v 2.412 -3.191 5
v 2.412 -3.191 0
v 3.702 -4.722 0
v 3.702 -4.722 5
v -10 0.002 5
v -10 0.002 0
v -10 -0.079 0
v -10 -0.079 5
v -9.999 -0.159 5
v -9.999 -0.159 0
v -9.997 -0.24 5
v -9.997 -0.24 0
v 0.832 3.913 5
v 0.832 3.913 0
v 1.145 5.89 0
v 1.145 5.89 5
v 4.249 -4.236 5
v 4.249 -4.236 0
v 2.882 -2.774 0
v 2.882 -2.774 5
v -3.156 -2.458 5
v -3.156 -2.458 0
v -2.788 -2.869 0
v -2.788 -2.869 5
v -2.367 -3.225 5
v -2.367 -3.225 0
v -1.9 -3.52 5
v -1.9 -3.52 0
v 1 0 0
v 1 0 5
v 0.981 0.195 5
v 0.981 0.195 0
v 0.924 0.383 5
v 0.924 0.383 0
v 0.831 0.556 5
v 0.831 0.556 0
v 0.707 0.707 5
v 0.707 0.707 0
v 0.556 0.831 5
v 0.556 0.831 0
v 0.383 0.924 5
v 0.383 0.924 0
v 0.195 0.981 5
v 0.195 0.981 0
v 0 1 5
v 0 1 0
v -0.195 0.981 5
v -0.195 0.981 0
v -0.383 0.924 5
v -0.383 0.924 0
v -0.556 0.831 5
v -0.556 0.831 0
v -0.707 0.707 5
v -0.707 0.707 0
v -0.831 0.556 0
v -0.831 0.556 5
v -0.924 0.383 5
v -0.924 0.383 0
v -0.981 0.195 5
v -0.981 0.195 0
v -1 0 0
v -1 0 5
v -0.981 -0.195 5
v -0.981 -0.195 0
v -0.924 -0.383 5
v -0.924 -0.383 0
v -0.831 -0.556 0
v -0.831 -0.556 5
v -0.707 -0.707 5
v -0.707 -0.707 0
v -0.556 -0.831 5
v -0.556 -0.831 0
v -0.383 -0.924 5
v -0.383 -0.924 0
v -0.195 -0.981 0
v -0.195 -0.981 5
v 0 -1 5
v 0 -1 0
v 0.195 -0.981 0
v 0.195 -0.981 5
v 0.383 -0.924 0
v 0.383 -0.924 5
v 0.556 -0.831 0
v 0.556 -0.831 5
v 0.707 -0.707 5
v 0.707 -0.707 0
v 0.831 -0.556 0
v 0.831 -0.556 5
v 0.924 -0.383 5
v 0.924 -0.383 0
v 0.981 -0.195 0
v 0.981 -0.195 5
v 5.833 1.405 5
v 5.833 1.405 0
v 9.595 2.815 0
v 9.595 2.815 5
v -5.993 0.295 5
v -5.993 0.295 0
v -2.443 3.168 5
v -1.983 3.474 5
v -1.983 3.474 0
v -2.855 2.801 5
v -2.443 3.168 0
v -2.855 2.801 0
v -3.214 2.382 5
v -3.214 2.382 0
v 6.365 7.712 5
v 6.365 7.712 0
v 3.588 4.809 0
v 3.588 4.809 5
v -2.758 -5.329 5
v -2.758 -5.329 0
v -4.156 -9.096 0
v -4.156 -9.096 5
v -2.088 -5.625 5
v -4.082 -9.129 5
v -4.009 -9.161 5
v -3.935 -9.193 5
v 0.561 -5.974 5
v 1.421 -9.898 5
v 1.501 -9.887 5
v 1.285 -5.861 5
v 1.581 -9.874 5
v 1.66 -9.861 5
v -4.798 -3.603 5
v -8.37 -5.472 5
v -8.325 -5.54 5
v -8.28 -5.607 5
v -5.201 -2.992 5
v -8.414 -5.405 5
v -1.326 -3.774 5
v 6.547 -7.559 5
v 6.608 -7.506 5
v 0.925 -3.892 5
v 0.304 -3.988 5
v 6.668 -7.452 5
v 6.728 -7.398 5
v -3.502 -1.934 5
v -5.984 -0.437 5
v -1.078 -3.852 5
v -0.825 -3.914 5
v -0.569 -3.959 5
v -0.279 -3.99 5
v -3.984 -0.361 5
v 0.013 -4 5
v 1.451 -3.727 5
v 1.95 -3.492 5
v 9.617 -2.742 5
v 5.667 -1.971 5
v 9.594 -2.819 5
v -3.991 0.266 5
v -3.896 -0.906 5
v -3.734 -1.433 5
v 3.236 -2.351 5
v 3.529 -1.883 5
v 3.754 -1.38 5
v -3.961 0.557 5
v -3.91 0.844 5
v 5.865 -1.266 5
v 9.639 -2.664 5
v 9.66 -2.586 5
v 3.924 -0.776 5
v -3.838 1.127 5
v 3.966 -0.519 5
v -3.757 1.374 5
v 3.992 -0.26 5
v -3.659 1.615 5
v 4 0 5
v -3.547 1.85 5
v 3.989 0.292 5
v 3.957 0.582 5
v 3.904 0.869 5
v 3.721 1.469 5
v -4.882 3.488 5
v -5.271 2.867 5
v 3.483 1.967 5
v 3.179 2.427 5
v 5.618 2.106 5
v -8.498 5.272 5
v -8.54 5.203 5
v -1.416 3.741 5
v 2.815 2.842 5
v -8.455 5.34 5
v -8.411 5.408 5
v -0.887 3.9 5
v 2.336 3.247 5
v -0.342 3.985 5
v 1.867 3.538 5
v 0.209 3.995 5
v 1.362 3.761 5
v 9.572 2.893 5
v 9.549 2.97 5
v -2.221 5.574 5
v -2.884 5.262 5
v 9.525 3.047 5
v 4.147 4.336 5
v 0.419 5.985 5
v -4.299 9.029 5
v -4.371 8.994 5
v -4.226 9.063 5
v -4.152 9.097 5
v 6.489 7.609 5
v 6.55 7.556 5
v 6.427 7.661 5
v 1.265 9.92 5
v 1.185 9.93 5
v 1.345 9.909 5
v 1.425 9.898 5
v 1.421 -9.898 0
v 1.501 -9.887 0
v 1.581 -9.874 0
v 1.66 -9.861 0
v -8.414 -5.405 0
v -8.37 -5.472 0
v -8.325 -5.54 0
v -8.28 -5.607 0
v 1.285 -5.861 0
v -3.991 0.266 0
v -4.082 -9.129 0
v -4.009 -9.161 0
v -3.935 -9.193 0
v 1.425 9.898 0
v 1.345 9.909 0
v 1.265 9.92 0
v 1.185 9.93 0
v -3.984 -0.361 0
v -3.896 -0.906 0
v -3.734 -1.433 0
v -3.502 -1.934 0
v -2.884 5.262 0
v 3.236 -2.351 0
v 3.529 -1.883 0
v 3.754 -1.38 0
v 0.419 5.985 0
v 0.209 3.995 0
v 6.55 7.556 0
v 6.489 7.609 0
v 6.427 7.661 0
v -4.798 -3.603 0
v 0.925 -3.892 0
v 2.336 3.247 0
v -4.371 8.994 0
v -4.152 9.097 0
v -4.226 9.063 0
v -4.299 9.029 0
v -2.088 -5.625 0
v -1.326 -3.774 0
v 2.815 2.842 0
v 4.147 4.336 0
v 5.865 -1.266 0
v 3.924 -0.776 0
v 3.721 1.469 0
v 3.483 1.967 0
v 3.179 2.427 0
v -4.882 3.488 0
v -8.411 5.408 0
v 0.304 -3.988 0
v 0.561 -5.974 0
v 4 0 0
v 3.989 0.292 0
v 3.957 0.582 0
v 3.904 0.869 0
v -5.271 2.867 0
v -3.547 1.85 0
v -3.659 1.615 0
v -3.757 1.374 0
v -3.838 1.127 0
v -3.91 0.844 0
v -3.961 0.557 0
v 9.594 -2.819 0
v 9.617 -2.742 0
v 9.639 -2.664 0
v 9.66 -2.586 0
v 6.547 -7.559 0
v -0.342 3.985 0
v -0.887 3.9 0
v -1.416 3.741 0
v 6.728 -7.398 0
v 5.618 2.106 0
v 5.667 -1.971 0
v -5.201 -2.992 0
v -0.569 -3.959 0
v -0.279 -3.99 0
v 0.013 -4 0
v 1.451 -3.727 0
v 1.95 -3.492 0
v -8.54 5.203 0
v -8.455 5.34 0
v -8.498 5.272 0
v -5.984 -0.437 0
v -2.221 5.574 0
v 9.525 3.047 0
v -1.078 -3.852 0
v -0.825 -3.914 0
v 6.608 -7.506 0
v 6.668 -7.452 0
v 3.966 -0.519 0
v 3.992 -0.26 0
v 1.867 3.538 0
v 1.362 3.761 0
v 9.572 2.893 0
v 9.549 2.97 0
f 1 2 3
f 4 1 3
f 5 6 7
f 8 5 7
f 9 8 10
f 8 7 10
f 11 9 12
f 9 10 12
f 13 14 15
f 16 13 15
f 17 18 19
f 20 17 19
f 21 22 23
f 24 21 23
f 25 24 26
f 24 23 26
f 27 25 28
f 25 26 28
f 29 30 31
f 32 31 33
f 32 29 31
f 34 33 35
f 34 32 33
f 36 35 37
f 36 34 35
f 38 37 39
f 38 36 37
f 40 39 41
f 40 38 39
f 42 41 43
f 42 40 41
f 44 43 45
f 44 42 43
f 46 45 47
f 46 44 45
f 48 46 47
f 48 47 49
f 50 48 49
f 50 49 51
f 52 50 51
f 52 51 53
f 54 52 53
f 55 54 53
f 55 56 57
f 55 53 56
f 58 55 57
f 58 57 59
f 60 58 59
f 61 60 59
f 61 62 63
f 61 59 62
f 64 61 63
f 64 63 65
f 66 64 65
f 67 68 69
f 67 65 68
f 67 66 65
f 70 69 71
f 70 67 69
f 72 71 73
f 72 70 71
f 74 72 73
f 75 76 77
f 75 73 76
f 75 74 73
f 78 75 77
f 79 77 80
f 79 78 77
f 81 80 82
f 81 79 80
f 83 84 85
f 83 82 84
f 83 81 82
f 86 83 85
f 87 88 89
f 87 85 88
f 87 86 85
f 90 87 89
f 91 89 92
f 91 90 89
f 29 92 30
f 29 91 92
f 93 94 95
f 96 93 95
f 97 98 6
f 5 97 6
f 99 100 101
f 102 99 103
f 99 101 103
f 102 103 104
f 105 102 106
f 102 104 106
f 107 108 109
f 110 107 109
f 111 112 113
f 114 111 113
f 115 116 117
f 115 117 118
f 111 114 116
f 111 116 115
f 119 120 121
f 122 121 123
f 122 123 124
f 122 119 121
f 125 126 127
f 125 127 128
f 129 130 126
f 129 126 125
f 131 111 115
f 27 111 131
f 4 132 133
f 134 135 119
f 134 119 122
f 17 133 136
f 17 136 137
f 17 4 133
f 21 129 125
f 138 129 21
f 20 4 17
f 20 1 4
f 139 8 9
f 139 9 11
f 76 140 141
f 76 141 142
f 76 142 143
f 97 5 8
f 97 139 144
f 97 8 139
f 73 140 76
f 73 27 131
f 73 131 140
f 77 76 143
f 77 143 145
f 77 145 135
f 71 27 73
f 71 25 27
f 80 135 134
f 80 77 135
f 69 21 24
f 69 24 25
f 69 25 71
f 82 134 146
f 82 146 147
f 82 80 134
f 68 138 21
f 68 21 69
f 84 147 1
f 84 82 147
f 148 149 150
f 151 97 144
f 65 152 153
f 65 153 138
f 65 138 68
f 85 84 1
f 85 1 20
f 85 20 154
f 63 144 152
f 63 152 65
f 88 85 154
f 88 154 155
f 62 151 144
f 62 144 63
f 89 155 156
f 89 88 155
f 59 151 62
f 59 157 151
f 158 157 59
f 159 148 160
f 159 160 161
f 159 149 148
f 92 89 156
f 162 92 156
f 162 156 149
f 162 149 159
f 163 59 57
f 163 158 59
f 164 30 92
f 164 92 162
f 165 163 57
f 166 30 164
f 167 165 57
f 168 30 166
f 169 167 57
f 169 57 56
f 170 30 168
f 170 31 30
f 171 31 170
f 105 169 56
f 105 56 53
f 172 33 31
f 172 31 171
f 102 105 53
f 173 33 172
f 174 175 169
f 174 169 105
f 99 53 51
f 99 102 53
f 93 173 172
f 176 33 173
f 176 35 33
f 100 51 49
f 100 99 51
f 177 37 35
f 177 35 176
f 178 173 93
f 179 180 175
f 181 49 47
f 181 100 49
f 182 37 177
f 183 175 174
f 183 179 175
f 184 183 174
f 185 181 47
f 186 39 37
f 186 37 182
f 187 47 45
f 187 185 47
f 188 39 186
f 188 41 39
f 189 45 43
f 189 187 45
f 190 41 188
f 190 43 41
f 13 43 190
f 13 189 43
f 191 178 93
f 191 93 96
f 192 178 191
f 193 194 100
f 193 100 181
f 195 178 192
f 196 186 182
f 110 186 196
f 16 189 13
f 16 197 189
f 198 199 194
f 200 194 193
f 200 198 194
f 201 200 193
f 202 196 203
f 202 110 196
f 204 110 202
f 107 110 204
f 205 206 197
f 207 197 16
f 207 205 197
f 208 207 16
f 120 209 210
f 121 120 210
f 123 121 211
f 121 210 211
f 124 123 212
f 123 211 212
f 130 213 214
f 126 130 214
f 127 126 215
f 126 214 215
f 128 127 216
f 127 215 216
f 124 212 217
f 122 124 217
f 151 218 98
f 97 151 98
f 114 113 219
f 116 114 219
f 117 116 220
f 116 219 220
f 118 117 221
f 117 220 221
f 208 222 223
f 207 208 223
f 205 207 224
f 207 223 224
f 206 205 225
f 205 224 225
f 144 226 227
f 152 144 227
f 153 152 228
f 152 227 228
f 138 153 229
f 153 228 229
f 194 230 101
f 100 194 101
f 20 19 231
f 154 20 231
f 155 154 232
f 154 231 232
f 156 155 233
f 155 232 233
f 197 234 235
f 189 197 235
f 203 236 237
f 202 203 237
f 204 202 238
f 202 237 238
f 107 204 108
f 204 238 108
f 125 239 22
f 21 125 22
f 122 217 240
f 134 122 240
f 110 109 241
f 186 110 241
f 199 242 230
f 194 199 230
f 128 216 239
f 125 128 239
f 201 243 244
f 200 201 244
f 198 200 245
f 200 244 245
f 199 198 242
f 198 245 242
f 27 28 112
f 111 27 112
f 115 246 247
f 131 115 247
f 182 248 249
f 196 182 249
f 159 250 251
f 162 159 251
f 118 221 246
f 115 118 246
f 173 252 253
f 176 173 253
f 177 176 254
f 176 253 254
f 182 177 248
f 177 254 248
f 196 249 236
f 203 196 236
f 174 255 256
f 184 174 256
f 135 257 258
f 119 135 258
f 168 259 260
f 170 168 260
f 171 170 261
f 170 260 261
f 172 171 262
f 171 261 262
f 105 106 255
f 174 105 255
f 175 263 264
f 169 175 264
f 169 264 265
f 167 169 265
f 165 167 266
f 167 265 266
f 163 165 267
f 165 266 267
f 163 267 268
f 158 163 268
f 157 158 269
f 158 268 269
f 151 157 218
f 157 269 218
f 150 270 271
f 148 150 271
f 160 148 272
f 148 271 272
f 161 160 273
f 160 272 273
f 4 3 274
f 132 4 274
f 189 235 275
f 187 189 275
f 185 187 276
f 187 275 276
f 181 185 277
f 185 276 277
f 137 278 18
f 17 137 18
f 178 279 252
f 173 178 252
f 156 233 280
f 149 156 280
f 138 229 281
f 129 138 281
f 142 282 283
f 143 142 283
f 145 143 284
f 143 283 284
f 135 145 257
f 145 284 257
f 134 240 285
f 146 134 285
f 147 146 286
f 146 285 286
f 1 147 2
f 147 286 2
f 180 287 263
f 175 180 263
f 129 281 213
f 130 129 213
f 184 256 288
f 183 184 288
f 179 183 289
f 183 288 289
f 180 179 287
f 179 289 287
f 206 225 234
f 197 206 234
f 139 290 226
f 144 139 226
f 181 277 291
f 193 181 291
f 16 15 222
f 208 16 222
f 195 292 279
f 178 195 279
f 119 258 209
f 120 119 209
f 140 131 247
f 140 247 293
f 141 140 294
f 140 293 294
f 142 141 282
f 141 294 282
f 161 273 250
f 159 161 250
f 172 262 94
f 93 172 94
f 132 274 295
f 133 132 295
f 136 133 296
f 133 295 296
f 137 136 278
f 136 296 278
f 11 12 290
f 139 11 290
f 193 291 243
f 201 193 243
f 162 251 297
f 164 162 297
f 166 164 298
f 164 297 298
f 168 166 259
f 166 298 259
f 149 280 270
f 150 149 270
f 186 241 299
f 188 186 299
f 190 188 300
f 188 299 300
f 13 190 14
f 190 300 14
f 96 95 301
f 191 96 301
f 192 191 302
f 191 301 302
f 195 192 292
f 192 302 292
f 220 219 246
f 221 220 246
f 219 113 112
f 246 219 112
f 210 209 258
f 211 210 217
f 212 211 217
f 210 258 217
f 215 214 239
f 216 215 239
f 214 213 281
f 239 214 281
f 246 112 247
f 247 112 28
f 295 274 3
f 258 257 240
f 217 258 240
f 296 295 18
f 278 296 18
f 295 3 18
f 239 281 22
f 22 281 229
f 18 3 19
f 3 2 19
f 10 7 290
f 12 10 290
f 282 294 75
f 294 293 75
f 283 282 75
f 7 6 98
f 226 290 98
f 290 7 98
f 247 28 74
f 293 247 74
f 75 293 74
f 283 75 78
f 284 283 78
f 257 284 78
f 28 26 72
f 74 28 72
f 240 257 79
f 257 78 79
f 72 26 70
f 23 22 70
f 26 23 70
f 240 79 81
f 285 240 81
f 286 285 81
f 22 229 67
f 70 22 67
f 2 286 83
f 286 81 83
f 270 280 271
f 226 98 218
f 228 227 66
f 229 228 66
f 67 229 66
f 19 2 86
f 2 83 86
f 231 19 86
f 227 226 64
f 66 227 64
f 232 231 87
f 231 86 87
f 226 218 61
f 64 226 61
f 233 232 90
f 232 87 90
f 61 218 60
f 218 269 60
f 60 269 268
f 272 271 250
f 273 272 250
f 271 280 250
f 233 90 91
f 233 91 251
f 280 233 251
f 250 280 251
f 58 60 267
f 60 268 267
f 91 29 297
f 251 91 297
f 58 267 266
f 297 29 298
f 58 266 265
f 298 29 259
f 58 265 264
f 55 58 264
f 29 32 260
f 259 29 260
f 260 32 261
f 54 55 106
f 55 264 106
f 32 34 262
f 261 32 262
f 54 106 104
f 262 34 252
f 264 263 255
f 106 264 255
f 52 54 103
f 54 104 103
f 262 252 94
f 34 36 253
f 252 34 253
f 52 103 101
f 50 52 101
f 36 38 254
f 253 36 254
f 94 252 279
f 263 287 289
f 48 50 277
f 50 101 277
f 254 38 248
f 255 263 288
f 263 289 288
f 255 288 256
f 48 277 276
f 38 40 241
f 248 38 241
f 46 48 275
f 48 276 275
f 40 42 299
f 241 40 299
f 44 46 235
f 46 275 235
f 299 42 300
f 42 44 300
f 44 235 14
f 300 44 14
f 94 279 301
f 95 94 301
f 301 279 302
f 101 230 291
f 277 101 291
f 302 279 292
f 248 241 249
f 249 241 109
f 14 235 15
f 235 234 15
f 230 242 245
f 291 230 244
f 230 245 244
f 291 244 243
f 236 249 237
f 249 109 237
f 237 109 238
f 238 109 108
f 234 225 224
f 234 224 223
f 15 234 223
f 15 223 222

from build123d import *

# Parameters (mm, degrees)
F0_R     = 1
F1_DEPTH = 5
F2_DEPTH = 5
F3_COUNT = 11


with BuildPart() as f1:
    # F0 (on Top) → F1 (new body)
    with BuildSketch(Plane.XY):
        with BuildLine():
            ThreePointArc((4, 0), (3.1085838458, 2.5172815642), (0.8316467633, 3.9125904029))
            ThreePointArc((0.8316467633, 3.9125904029), (0.5221047689, 3.9657794455), (0.209343825, 3.994518139))
            ThreePointArc((0.209343825, 3.994518139), (-2.901497484, -2.7534183028), (4, 0))
        make_face()
        Circle(F0_R, mode=Mode.SUBTRACT)
    extrude(amount=F1_DEPTH)

    # F0 (on Top) → F2 (join)
    with BuildSketch(Plane.XY):
        with BuildLine():
            Line((1.1448017618, 5.8897732491), (1.4250798414, 9.8979365246))
            ThreePointArc((1.4250798414, 9.8979365246), (1.3052619222, 9.9144486137), (1.1852530565, 9.9295103199))
            Line((1.1852530565, 9.9295103199), (0.4185919005, 5.9853805911))
            Line((0.4185919005, 5.9853805911), (0.209343825, 3.994518139))
            ThreePointArc((0.209343825, 3.994518139), (0.5221047689, 3.9657794455), (0.8316467633, 3.9125904029))
            Line((0.8316467633, 3.9125904029), (1.1448017618, 5.8897732491))
        make_face()
    extrude(amount=F2_DEPTH)

    # F3: F1 ×11 about axis
    f3_axis = Axis((0, 0, 0), (0, 0, -1))


with BuildPart() as f1_1:
    add(f1.part)
    for i in range(1, F3_COUNT):
        add(f1.part.rotate(f3_axis, i * 360 / F3_COUNT))


solid = f1_1.part
